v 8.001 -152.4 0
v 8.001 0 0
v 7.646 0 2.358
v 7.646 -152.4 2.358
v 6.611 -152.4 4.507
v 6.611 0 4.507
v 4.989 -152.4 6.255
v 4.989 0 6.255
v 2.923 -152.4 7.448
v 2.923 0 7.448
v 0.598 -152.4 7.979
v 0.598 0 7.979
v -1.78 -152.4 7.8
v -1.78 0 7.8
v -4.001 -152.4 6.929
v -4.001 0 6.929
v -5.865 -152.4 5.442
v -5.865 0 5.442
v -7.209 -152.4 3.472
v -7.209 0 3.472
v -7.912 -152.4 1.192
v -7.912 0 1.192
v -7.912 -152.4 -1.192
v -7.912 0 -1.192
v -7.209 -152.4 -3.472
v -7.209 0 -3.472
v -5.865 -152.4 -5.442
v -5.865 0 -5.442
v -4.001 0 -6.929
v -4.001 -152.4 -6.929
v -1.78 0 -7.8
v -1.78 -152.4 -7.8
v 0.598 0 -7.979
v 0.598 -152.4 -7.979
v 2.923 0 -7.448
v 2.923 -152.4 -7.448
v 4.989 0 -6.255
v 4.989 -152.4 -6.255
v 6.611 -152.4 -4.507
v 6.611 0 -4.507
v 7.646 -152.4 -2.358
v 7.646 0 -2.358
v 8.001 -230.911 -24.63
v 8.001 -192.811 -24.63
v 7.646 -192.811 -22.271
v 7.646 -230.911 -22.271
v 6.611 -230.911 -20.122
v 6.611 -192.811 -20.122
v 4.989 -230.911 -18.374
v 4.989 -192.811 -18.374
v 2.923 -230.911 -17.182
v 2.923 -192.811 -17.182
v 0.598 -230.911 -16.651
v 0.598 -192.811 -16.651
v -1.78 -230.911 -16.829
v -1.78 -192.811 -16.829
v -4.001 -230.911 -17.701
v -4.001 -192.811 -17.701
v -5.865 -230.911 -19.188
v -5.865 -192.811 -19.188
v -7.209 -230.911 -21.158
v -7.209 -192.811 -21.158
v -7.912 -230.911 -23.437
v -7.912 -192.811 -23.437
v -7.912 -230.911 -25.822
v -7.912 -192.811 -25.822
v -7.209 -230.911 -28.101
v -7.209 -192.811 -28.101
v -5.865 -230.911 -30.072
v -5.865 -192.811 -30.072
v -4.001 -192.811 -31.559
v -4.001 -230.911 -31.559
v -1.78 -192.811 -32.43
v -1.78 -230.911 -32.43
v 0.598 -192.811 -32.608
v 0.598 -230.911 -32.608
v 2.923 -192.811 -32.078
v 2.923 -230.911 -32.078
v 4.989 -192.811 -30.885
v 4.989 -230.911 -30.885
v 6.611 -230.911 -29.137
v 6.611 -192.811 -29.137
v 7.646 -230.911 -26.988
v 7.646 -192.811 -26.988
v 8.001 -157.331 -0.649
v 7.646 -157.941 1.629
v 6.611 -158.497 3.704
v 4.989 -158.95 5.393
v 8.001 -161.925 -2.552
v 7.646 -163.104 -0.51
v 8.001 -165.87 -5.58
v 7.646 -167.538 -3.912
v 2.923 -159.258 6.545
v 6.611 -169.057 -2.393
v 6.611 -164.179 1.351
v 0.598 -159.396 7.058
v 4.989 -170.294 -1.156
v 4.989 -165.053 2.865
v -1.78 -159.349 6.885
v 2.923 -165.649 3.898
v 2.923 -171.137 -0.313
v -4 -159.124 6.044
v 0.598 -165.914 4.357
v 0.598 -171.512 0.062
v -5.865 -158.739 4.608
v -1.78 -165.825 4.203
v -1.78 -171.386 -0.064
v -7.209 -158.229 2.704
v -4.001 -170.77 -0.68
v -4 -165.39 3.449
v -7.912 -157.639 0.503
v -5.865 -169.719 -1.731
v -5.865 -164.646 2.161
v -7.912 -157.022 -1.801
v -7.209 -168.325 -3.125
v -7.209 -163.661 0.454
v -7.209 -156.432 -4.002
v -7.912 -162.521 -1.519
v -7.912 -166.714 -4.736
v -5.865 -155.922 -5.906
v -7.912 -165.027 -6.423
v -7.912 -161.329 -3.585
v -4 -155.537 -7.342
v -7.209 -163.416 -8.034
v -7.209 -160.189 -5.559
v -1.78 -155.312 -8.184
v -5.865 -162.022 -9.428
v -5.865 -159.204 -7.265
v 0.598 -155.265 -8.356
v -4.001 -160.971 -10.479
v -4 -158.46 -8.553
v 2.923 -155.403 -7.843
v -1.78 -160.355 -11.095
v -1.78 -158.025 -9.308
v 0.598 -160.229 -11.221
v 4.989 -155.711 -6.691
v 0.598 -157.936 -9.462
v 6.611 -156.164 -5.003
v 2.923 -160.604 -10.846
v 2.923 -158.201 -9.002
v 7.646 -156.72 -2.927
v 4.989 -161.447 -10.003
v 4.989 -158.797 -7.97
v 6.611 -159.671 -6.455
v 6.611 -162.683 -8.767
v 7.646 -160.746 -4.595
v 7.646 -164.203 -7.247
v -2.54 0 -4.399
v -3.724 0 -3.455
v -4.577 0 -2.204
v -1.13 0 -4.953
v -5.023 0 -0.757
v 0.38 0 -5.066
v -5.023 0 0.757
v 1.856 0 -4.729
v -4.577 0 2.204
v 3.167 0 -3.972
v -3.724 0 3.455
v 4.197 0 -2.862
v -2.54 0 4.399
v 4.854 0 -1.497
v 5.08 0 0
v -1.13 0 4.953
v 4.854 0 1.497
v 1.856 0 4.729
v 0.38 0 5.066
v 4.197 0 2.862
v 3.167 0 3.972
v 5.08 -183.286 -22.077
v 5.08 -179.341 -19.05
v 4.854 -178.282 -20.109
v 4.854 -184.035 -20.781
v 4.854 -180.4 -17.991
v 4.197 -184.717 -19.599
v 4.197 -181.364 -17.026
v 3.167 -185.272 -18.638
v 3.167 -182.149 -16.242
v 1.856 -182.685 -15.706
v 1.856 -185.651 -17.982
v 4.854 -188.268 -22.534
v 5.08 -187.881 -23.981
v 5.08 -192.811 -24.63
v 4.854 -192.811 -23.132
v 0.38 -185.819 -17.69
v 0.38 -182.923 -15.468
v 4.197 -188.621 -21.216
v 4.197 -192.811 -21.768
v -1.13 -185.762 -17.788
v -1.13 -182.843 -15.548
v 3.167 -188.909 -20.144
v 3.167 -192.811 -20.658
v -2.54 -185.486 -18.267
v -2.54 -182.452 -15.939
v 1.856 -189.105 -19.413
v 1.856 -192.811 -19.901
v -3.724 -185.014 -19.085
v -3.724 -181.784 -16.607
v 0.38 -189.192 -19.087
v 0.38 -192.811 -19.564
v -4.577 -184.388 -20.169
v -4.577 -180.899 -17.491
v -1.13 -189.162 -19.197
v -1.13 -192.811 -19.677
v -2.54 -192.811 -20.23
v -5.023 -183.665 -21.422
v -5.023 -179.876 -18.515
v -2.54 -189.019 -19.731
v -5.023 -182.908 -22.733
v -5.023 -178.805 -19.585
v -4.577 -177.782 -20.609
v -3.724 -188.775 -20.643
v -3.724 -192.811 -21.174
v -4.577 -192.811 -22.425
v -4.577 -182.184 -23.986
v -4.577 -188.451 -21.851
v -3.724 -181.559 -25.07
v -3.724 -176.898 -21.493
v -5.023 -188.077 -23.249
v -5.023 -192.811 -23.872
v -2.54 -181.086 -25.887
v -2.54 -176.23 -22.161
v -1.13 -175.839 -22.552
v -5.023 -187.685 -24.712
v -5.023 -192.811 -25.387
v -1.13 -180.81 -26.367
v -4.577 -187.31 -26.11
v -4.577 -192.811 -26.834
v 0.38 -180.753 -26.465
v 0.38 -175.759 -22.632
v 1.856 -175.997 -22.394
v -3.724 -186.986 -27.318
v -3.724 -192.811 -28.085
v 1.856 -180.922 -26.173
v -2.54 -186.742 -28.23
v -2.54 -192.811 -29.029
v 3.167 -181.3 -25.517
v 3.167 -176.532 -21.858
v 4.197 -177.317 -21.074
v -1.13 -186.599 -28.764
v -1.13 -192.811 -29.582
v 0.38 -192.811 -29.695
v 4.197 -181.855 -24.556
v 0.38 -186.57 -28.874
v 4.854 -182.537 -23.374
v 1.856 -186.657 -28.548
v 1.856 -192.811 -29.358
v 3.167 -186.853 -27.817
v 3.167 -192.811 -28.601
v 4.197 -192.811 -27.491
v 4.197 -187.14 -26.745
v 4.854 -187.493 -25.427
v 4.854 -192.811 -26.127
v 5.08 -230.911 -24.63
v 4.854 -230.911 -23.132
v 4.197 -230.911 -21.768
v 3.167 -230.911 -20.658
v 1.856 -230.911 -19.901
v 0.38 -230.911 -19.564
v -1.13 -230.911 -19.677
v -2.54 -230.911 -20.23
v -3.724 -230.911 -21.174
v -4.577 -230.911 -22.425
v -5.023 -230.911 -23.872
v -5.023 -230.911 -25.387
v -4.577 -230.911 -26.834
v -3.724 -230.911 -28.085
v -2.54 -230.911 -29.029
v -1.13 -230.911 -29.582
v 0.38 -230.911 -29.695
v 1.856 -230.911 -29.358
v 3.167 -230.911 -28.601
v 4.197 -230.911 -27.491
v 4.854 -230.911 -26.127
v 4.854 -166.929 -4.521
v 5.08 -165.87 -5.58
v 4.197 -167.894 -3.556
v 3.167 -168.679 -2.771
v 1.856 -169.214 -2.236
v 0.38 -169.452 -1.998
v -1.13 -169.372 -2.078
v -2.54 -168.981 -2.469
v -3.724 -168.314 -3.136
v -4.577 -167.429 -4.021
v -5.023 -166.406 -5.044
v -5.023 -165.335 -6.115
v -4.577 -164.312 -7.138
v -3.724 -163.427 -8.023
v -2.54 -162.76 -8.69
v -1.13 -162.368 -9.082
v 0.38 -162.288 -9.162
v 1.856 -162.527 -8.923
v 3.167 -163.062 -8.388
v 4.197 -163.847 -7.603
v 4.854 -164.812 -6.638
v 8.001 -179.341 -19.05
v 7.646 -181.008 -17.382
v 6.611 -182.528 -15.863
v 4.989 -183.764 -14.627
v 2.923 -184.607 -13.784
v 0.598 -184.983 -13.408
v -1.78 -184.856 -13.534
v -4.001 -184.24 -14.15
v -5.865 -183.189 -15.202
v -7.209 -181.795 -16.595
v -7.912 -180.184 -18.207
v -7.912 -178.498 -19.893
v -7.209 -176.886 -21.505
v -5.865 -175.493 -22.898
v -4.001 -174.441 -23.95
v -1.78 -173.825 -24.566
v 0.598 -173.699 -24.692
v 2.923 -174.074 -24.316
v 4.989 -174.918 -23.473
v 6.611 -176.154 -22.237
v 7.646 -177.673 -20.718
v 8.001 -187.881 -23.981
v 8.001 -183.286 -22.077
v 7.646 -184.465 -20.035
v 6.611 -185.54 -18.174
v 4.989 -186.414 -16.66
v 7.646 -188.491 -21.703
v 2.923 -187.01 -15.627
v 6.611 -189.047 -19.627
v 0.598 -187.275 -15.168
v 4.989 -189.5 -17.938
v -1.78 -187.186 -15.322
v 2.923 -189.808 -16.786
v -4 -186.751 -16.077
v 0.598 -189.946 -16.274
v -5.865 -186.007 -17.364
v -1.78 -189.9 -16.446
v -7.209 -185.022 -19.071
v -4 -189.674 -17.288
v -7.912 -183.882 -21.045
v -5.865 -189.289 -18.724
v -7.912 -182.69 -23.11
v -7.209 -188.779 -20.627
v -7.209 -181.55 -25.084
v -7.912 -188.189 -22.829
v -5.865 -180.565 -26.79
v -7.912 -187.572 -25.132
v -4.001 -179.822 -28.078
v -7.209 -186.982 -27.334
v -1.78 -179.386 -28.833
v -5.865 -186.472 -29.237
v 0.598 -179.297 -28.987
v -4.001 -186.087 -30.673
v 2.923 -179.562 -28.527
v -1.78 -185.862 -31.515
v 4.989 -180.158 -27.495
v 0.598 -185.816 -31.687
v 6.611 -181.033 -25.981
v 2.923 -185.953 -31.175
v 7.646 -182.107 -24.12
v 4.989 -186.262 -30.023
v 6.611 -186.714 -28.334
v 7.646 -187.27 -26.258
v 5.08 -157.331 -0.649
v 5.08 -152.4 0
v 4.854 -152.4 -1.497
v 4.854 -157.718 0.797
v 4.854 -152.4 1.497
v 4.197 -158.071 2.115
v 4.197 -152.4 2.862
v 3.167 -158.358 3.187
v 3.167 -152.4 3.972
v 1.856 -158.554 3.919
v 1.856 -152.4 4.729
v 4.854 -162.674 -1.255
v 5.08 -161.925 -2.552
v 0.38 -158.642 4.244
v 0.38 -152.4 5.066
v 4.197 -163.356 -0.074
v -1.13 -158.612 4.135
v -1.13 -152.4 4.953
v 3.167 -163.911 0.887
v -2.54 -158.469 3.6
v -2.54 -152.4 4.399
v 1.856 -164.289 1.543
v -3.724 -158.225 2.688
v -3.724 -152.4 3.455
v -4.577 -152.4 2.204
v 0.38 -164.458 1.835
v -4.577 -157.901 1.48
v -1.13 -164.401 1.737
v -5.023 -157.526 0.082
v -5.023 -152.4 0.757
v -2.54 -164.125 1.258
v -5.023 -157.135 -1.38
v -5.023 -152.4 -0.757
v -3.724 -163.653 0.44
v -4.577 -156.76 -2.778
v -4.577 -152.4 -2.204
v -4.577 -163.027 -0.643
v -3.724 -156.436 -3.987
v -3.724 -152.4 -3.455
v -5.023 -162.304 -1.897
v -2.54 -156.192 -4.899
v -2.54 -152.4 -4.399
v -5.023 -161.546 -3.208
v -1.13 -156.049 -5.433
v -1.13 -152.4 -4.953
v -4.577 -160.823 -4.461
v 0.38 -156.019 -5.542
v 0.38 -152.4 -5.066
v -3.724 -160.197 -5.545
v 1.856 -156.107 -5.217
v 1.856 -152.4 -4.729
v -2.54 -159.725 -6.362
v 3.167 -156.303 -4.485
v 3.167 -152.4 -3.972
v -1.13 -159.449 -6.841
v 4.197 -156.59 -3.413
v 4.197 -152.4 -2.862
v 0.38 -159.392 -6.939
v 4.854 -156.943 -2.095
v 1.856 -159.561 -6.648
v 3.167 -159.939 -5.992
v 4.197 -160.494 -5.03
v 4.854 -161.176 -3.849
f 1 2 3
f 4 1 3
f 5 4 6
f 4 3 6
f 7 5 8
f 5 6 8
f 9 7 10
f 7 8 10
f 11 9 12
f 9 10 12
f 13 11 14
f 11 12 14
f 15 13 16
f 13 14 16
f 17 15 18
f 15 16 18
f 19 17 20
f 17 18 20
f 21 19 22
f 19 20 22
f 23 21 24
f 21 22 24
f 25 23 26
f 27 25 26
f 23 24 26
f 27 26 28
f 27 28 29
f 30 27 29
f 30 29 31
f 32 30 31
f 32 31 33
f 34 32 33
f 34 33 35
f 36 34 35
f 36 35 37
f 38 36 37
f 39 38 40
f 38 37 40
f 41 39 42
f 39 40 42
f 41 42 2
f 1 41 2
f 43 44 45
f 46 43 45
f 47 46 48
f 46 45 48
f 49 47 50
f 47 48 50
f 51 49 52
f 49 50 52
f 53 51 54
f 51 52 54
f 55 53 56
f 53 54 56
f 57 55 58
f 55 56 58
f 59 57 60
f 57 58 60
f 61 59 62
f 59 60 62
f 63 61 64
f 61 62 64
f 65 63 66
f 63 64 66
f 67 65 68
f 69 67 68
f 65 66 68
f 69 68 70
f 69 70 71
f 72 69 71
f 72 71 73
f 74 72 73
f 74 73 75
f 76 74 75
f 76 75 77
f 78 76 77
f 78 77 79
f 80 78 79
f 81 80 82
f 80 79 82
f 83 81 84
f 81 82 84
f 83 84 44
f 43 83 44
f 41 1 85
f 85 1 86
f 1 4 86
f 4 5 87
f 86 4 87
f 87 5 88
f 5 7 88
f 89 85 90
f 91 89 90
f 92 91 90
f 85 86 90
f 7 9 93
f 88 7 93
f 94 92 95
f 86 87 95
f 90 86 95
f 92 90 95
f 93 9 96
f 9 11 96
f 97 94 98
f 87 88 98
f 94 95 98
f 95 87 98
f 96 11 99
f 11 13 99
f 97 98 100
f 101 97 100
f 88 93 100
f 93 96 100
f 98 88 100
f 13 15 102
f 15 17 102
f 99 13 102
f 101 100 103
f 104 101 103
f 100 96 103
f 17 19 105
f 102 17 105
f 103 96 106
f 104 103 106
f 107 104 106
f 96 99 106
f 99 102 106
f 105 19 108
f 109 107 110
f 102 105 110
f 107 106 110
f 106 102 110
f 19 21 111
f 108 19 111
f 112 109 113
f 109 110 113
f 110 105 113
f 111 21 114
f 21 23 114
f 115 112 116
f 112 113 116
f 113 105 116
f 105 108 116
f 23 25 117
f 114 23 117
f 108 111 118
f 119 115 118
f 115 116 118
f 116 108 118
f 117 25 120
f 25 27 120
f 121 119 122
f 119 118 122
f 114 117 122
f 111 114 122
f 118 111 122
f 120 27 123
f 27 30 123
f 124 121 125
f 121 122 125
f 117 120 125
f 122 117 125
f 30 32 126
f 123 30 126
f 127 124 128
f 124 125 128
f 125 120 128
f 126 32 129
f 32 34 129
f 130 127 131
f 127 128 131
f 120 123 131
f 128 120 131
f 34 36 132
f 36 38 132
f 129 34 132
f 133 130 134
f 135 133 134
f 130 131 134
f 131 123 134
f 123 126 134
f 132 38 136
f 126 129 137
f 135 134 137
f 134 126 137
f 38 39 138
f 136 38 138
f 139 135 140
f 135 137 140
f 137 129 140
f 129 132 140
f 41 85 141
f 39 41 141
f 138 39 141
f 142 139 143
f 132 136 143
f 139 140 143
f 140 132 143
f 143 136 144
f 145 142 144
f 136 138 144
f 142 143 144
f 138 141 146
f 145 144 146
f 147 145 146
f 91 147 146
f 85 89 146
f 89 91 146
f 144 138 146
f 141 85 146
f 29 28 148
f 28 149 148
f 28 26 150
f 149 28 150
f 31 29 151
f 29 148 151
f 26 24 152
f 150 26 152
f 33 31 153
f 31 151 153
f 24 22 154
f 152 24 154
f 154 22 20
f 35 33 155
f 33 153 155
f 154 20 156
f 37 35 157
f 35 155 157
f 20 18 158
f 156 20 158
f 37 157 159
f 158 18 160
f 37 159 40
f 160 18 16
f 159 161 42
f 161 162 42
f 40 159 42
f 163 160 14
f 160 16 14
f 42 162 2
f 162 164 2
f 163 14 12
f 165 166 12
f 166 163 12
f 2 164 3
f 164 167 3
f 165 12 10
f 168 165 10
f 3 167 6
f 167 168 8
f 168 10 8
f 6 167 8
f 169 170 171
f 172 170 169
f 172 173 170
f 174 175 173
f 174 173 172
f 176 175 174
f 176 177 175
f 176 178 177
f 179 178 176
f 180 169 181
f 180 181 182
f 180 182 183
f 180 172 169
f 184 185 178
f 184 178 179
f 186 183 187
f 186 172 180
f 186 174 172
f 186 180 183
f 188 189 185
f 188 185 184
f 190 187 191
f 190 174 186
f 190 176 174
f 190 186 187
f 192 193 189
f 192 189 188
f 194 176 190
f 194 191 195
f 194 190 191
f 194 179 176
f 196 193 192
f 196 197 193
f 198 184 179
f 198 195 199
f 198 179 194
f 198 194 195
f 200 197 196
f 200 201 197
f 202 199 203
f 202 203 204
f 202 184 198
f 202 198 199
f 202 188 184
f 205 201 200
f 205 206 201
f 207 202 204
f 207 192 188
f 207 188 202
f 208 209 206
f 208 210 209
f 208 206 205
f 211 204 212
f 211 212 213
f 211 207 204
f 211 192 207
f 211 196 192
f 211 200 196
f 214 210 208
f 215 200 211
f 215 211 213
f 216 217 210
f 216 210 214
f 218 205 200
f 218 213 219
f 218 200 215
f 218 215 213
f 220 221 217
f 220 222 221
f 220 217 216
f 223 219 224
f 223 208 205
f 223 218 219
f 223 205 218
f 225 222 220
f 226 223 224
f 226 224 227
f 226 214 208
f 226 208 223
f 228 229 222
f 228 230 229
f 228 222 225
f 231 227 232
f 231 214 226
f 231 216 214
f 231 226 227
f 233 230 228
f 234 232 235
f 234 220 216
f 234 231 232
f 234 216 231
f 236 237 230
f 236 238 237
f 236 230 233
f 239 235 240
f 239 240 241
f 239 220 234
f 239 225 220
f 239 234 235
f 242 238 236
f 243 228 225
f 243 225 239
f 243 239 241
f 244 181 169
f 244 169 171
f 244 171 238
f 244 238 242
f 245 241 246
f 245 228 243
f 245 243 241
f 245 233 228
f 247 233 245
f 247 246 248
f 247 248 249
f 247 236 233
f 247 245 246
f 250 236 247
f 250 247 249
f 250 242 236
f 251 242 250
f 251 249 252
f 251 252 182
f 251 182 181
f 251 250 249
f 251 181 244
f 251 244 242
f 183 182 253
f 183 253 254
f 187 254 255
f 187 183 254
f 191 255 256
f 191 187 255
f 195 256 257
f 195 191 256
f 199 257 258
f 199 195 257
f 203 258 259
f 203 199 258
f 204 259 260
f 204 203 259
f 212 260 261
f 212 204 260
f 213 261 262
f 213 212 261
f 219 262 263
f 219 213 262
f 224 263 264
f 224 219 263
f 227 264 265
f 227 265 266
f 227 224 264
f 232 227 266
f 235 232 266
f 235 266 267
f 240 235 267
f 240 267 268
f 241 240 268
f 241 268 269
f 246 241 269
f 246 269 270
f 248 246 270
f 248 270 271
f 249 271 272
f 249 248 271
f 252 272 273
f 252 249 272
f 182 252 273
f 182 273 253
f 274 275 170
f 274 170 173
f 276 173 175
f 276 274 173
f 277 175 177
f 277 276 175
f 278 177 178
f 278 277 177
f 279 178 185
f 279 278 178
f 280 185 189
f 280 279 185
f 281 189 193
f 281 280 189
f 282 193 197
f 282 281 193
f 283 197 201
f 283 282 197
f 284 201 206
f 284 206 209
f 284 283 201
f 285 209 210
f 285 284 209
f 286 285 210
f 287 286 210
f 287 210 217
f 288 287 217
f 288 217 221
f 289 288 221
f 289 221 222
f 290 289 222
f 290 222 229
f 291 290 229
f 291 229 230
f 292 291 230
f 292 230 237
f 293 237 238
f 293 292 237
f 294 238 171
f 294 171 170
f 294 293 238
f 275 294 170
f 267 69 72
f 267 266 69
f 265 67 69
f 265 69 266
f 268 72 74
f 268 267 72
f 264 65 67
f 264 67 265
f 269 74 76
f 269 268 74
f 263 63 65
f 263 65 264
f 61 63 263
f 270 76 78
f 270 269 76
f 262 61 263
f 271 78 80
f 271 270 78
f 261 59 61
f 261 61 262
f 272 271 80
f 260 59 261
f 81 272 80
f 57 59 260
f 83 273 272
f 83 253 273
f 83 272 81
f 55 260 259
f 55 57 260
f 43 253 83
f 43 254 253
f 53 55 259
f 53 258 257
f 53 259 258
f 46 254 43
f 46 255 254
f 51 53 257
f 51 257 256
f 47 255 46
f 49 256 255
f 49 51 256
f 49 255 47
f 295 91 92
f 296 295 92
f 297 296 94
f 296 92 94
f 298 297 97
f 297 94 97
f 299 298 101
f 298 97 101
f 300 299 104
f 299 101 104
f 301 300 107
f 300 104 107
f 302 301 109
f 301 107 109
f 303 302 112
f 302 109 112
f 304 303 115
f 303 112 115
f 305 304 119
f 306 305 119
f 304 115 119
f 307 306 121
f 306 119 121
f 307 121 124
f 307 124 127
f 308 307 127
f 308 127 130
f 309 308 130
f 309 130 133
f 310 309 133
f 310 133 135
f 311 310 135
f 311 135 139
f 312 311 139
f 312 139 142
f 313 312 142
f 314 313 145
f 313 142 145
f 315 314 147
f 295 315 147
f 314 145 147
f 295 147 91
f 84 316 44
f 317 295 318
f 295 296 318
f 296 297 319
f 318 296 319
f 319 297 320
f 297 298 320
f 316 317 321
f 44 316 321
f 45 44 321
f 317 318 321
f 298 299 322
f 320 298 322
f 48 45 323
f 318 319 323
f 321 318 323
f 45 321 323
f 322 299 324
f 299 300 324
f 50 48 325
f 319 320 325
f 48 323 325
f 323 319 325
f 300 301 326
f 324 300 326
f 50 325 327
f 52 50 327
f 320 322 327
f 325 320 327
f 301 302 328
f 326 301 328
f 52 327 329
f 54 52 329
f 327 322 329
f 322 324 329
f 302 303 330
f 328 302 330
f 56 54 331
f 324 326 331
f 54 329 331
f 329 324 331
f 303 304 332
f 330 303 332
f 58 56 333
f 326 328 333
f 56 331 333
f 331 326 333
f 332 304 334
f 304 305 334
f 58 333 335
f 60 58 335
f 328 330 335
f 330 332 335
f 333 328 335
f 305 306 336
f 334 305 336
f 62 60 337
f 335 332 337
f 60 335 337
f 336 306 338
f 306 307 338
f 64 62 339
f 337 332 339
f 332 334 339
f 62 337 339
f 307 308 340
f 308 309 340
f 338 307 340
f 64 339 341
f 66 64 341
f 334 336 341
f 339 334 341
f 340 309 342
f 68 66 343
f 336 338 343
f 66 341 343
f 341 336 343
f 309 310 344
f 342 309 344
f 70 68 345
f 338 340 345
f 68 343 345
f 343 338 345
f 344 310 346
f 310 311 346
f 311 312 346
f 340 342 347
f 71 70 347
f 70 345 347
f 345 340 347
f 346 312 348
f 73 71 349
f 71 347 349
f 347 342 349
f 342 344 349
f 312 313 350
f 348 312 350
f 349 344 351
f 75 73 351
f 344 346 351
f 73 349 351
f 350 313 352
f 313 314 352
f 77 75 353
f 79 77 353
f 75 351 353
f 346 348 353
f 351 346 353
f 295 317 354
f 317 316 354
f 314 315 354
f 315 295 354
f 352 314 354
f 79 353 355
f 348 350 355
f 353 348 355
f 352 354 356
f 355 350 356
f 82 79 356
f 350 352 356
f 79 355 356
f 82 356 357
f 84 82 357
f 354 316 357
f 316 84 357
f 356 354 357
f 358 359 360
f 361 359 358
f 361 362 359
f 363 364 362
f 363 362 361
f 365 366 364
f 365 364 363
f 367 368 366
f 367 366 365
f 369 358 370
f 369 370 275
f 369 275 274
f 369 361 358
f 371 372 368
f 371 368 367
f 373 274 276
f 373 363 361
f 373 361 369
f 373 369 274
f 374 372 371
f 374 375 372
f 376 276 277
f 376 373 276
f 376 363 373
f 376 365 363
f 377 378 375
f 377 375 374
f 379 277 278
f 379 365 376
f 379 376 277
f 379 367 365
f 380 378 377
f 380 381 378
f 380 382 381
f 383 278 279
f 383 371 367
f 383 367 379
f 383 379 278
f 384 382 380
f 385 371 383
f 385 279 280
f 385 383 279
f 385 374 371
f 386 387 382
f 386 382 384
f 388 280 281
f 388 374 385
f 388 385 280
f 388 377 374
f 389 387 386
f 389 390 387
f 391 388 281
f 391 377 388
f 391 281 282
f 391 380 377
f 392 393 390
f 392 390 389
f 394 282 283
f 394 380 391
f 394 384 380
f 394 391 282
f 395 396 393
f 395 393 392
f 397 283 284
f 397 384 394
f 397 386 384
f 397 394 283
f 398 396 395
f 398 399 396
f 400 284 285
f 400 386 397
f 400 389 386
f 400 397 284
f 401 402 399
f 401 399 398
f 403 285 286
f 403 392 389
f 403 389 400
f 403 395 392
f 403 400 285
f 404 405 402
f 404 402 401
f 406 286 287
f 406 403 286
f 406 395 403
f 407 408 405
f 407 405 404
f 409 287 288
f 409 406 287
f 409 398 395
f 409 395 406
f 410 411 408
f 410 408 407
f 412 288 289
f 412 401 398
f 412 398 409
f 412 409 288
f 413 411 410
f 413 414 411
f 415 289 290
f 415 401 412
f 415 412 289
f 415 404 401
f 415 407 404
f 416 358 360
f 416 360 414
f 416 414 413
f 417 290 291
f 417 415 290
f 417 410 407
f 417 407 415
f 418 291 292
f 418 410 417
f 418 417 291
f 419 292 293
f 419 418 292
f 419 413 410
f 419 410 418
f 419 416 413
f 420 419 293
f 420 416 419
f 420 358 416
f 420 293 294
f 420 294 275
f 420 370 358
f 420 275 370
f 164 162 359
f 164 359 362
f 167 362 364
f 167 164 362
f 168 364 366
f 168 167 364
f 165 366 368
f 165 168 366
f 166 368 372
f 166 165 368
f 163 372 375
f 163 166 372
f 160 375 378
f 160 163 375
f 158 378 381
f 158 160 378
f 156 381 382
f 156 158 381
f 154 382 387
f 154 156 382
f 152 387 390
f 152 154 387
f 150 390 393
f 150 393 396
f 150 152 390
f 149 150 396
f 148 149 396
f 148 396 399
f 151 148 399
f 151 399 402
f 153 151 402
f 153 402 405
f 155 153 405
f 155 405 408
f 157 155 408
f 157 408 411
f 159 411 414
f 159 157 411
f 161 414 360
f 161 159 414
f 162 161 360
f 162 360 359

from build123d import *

# Parameters (mm, degrees)
F0_R     = 8.001
F0_R_2   = 5.08
F1_DEPTH = 152.4
F2_R     = 8.001
F2_R_2   = 5.08
F3_ANGLE = 45
F4_R     = 8.001
F4_R_2   = 5.08
F5_DEPTH = 19.05
F6_R     = 8.001
F6_R_2   = 5.08
F7_ANGLE = 45
F8_R     = 8.001
F8_R_2   = 5.08
F9_DEPTH = 38.1


with BuildPart() as f1:
    # F0 (on Front) → F1 (new body)
    with BuildSketch(Plane.XZ):
        Circle(F0_R)
        Circle(F0_R_2, mode=Mode.SUBTRACT)
    extrude(amount=F1_DEPTH)

    # F2 (on face) → F3 (revolve)
    with BuildSketch(Plane.XZ.offset(152.4)):
        Circle(F2_R)
        Circle(F2_R_2, mode=Mode.SUBTRACT)
    revolve(axis=Axis((1.8257172778, -152.4, -19.05), (1, 0, 0)), revolution_arc=F3_ANGLE)

    # F4 (on face) → F5 (join)
    with BuildSketch(Plane(origin=(0, -85.725, -85.725), x_dir=(1, 0, 0), z_dir=(0, -0.7071067812, -0.7071067812))):
        with Locations((0, 113.3426892712)):
            Circle(F4_R)
        with Locations((0, 113.3426892712)):
            Circle(F4_R_2, mode=Mode.SUBTRACT)
    extrude(amount=F5_DEPTH)

    # F6 (on face) → F7 (revolve)
    with BuildSketch(Plane(origin=(0, -99.1953841816, -99.1953841816), x_dir=(1, 0, 0), z_dir=(0, -0.7071067812, -0.7071067812))):
        with Locations((0, 113.3426892712)):
            Circle(F6_R)
        with Locations((0, 113.3426892712)):
            Circle(F6_R_2, mode=Mode.SUBTRACT)
    revolve(axis=Axis((0.5769948475, -192.8111525448, -5.5796158184), (-1, 0, 0)), revolution_arc=F7_ANGLE)

    # F8 (on face) → F9 (join)
    with BuildSketch(Plane.XZ.offset(192.8111525448)):
        with Locations((0, -24.6296158184)):
            Circle(F8_R)
        with Locations((0, -24.6296158184)):
            Circle(F8_R_2, mode=Mode.SUBTRACT)
    extrude(amount=F9_DEPTH)


solid = f1.part
